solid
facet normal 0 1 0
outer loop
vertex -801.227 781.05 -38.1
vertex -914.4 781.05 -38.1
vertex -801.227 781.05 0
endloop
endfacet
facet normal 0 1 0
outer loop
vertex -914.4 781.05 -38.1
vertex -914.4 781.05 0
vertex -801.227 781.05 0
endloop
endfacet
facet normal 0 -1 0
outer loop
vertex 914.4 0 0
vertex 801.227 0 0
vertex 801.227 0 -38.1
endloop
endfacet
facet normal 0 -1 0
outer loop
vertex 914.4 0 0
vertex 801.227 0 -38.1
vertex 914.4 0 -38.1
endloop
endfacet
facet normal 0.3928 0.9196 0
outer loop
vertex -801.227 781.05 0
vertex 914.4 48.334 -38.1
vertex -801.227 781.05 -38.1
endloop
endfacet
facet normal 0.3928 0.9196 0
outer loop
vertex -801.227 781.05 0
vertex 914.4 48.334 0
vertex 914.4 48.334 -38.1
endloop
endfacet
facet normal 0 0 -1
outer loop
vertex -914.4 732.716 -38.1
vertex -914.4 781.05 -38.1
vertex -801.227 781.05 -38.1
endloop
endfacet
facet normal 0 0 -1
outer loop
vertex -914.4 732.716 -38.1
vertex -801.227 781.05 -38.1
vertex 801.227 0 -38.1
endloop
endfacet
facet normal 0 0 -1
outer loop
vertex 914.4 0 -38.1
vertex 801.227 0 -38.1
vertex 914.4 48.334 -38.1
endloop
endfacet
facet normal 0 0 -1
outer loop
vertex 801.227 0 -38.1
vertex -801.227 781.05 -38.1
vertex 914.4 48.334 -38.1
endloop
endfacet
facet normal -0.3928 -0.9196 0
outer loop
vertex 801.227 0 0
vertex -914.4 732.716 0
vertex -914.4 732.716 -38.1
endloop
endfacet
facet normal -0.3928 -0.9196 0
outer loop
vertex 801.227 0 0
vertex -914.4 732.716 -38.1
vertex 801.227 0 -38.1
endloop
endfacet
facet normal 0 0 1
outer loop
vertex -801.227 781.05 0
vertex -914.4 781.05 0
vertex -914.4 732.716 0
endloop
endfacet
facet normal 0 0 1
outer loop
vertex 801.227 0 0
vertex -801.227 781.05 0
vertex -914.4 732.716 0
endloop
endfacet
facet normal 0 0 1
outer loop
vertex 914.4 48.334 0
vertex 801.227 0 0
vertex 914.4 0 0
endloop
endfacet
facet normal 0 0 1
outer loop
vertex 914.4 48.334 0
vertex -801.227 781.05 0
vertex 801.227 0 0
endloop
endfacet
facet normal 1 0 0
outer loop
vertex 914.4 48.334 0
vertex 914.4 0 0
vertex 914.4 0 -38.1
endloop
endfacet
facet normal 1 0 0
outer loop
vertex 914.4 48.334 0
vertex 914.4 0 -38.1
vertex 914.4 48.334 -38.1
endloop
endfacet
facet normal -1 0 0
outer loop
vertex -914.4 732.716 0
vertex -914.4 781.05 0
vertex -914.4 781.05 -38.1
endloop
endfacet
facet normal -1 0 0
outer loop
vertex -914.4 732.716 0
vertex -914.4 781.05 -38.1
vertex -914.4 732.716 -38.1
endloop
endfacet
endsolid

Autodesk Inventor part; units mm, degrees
ref_plane "YZ Plane" through (0, 0, 0) normal (1, 0, 0) x (0, 1, 0)
ref_plane "XZ Plane" through (0, 0, 0) normal (0, 1, 0) x (-1, 0, 0)
ref_plane "XY Plane" through (0, 0, 0) normal (0, 0, 1) x (1, 0, 0)
sketch "Sketch1" plane through (0, 0, 0) normal (0, 0, 1) x (1, 0, 0)
  line L0 (914.4, -2482.85) -> (914.4, 2393.95) projected
  line L1 (-914.4, 0) -> (914.4, 0) projected
  line L2 (-914.4, 2393.95) -> (-914.4, -2482.85) projected
  line L3 (-914.4, 781.05) -> (914.4, 781.05) projected
  line L4 (-914.4, 732.7159) -> (801.2274, 0)
  line L5 (914.4, 48.3341) -> (-801.2274, 781.05)
  line L6 (914.4, 48.3341) -> (914.4, 0)
  line L7 (801.2274, 0) -> (914.4, 0)
  line L8 (-914.4, 732.7159) -> (-914.4, 781.05)
  line L9 (-801.2274, 781.05) -> (-914.4, 781.05)
  point P0 (0, 0)
extrude "Extrusion1" add sketch "Sketch1" against normal blind 38.1 contours L1 L4 L2 L3 L5 L0
properties part number "side3"
